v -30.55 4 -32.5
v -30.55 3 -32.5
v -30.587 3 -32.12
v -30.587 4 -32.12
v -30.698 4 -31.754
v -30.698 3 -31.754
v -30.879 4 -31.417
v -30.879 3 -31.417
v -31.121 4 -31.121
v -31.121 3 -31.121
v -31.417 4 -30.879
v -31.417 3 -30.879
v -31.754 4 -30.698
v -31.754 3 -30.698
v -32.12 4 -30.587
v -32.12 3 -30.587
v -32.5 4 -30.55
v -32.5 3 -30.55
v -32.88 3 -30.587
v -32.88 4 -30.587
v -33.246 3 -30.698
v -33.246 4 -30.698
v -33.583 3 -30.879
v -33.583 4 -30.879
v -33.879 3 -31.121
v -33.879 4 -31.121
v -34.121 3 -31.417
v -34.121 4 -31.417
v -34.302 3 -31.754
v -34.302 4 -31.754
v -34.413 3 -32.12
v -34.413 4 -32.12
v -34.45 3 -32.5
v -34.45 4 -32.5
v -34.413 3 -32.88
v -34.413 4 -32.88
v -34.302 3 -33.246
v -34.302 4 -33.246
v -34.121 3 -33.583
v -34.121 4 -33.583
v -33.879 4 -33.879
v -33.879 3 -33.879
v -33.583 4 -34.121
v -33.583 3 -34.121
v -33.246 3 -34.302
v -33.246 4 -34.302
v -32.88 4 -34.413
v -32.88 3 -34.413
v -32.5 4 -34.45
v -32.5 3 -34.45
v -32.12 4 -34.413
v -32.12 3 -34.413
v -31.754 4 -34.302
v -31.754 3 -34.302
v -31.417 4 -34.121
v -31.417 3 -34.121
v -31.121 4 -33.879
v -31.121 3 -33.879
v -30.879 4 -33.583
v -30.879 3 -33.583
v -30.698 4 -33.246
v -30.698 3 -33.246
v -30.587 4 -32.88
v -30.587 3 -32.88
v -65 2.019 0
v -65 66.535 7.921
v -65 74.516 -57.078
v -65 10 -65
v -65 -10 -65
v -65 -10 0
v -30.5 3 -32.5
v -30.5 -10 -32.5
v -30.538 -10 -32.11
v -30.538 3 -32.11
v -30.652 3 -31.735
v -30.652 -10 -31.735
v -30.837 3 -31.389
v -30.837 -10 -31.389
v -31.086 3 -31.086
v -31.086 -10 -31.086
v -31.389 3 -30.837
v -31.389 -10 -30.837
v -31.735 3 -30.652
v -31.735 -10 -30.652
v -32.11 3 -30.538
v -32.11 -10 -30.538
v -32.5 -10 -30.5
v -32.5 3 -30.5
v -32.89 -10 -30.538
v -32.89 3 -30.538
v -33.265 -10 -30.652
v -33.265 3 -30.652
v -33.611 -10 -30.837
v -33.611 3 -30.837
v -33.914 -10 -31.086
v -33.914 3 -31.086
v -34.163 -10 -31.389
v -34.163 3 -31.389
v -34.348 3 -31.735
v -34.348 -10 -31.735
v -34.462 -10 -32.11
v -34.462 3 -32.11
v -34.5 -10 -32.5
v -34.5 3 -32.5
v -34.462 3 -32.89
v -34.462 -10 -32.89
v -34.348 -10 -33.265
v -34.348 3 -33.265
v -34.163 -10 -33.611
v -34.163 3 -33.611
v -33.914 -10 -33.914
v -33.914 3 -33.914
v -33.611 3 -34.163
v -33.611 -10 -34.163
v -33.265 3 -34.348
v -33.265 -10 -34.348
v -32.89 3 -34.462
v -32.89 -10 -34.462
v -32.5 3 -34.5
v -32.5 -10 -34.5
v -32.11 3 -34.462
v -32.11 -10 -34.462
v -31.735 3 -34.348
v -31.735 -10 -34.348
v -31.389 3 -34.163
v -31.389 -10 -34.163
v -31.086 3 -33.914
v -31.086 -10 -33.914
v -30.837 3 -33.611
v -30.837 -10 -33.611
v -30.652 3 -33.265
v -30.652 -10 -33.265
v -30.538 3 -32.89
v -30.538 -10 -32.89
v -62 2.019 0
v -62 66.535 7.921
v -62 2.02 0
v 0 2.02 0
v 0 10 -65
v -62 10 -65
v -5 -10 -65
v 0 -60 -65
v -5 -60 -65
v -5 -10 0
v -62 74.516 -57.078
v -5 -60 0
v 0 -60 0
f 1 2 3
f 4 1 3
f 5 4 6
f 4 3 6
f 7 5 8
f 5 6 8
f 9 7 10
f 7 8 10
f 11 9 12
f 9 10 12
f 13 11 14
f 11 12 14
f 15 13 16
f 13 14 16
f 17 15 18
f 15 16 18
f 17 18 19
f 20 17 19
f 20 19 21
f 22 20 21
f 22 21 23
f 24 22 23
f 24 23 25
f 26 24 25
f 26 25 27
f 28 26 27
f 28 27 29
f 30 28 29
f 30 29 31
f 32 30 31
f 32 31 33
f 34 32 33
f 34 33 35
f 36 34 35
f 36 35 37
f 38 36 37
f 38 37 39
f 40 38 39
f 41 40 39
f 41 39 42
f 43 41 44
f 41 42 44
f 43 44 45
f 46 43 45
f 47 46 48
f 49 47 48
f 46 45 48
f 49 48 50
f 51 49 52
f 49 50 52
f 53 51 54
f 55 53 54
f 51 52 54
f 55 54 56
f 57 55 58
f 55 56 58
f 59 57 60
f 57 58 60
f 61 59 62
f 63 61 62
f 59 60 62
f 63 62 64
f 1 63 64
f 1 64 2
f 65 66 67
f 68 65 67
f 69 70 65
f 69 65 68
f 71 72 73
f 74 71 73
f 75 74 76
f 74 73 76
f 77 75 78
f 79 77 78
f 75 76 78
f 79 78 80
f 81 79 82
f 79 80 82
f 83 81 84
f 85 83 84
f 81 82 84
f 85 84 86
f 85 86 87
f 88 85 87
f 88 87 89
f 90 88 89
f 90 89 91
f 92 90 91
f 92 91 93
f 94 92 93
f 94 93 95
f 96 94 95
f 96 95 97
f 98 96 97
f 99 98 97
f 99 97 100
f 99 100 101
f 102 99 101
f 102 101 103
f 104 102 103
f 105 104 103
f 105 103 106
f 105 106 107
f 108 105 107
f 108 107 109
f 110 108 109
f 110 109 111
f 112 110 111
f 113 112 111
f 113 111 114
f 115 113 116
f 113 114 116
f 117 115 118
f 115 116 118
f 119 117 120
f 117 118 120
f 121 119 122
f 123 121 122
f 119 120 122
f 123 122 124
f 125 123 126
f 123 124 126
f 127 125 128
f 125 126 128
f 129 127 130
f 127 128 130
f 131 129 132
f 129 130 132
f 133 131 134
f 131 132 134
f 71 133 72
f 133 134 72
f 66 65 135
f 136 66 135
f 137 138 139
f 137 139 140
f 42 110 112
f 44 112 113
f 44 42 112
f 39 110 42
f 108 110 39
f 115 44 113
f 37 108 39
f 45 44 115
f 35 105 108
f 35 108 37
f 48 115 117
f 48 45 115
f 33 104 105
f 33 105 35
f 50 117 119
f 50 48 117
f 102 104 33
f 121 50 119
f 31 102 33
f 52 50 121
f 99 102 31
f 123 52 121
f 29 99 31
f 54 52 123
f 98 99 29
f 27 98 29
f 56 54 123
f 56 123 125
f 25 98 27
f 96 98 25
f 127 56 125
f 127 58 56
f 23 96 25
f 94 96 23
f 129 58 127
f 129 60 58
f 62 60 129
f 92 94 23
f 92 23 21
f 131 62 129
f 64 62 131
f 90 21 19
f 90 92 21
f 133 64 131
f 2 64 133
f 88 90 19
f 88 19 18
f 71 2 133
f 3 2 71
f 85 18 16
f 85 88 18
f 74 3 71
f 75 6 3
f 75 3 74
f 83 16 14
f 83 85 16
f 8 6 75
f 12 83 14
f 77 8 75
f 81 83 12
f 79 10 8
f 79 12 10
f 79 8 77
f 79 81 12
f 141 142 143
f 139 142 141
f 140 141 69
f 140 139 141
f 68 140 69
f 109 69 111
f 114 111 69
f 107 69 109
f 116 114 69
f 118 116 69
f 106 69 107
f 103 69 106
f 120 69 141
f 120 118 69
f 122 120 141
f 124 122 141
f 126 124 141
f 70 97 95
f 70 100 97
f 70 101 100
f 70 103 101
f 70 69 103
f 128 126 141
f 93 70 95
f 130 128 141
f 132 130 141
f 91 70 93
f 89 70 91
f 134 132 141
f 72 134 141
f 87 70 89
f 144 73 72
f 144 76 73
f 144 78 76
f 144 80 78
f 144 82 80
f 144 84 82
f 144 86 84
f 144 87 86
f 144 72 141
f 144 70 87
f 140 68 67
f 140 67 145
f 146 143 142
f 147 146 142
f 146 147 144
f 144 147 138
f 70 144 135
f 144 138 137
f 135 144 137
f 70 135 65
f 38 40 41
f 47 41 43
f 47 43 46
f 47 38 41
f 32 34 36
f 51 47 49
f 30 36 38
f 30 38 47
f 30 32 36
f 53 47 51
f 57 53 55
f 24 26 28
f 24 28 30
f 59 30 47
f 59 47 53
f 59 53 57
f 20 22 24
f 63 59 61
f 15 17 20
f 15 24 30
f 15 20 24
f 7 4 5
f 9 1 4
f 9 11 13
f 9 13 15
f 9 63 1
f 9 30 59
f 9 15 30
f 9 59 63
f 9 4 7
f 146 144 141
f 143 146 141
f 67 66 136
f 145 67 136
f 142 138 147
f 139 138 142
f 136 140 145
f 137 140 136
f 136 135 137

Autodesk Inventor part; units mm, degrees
ref_plane "YZ Plane" through (0, 0, 0) normal (1, 0, 0) x (0, 1, 0)
ref_plane "XZ Plane" through (0, 0, 0) normal (0, 1, 0) x (-1, 0, 0)
ref_plane "XY Plane" through (0, 0, 0) normal (0, 0, 1) x (1, 0, 0)
sketch "草图1" plane through (0, 0, 0) normal (0, 1, 0) x (-1, 0, 0)
  line L0 (0, 0) -> (65, 0)
  line L1 (65, 0) -> (65, -65)
  line L2 (65, -65) -> (0, -65)
  line L3 (0, -65) -> (0, 0)
  dimension "d0" = 65
  dimension "d1" = 65
extrude "拉伸1" add sketch "草图1" along normal blind 10
chamfer "倒角1" distance 65 angle 7 1 edges at (-32.5, 10, 0) measured on face at (-21.6667, 10, -43.3333)
sketch "草图2" plane through (0, 0, 0) normal (0, -1, 0) x (1, 0, 0)
  line L0 (-65, 0) -> (0, 0) projected
  line L1 (-32.5, 0) -> (-32.5, -65)
  line L2 (0, -65) -> (-65, -65) projected
  circle A0 centre (-32.5, -32.5) radius 1.95
  dimension "d7" = 3.9
extrude "拉伸2" cut sketch "草图2" against normal blind 4
sketch "草图4" plane through (0, 0, 0) normal (0, -1, 0) x (1, 0, 0)
  line L0 (0, 0) -> (0, -65) projected
  line L1 (0, -65) -> (-65, -65) projected
  line L2 (0, 0) -> (-5, 0)
  line L3 (-5, 0) -> (-5, -65)
  line L4 (-5, -65) -> (0, -65)
  line L5 (0, -65) -> (0, 0)
  dimension "d13" = 5
extrude "拉伸4" add sketch "草图4" along normal blind 60
sketch "草图5" plane through (-65, 10, -65) normal (0, 0.9925, 0.1219) x (1, 0, 0)
  line L0 (0, 0) -> (3, 0)
  line L1 (3, 0) -> (3, -35.2725)
  line L2 (3, -35.2725) -> (0, -35.2725)
  line L3 (0, -35.2725) -> (0, 0)
  line L4 (0, -65.4881) -> (65, -65.4881) projected
  line L5 (0, 0) -> (3, 0)
  line L6 (3, 0) -> (3, -65.4881)
  line L7 (3, -65.4881) -> (0, -65.4881)
  line L8 (0, -65.4881) -> (0, 0)
  point P0 (65, -65.7342)
  point P1 (0, -35.2725)
  point P2 (0, -65.4881)
  point P3 (3, -35.2725)
  dimension "d17" = 3
extrude "拉伸5" add sketch "草图5" along normal blind 65
sketch "草图6" plane through (0, 0, 0) normal (0, -1, 0) x (1, 0, 0)
  line L0 (0, -65) -> (-62, -65) projected
  line L1 (-65, 0) -> (-4.9882, 0)
  line L2 (-4.9882, 0) -> (-4.9882, -65)
  line L3 (-4.9882, -65) -> (-65, -65)
  line L4 (-65, -65) -> (-65, 0)
  point P0 (0, 0)
extrude "拉伸6" add sketch "草图6" along normal blind 10
sketch "草图8" plane through (0, -10, 0) normal (0, -1, 0) x (1, 0, 0)
  circle A0 centre (-32.5, -32.5) radius 1.95 projected
  circle A1 centre (-32.5, -32.5) radius 2
  point P0 (0, 0)
  dimension "d25" = 4
extrude "拉伸8" cut sketch "草图8" against normal blind 13 contours A0 | A1
equation "\"折弯半径\" = 厚度"
equation "\"折弯释压宽度\" = 厚度"
equation "\"折弯释压深度\" = 0.5 * 厚度"
equation "\"拐角释压尺寸\" = 4 * 厚度"
equation "\"最小余量\" = 2 * 厚度"
equation "\"过渡半径\" = 折弯半径"
equation "\"Jacobi半径尺寸\" = 折弯半径"
equation "\"间隙大小\" = 厚度"
equation "\"厚度\" = 0.5"
properties part number "_3D 打印"
